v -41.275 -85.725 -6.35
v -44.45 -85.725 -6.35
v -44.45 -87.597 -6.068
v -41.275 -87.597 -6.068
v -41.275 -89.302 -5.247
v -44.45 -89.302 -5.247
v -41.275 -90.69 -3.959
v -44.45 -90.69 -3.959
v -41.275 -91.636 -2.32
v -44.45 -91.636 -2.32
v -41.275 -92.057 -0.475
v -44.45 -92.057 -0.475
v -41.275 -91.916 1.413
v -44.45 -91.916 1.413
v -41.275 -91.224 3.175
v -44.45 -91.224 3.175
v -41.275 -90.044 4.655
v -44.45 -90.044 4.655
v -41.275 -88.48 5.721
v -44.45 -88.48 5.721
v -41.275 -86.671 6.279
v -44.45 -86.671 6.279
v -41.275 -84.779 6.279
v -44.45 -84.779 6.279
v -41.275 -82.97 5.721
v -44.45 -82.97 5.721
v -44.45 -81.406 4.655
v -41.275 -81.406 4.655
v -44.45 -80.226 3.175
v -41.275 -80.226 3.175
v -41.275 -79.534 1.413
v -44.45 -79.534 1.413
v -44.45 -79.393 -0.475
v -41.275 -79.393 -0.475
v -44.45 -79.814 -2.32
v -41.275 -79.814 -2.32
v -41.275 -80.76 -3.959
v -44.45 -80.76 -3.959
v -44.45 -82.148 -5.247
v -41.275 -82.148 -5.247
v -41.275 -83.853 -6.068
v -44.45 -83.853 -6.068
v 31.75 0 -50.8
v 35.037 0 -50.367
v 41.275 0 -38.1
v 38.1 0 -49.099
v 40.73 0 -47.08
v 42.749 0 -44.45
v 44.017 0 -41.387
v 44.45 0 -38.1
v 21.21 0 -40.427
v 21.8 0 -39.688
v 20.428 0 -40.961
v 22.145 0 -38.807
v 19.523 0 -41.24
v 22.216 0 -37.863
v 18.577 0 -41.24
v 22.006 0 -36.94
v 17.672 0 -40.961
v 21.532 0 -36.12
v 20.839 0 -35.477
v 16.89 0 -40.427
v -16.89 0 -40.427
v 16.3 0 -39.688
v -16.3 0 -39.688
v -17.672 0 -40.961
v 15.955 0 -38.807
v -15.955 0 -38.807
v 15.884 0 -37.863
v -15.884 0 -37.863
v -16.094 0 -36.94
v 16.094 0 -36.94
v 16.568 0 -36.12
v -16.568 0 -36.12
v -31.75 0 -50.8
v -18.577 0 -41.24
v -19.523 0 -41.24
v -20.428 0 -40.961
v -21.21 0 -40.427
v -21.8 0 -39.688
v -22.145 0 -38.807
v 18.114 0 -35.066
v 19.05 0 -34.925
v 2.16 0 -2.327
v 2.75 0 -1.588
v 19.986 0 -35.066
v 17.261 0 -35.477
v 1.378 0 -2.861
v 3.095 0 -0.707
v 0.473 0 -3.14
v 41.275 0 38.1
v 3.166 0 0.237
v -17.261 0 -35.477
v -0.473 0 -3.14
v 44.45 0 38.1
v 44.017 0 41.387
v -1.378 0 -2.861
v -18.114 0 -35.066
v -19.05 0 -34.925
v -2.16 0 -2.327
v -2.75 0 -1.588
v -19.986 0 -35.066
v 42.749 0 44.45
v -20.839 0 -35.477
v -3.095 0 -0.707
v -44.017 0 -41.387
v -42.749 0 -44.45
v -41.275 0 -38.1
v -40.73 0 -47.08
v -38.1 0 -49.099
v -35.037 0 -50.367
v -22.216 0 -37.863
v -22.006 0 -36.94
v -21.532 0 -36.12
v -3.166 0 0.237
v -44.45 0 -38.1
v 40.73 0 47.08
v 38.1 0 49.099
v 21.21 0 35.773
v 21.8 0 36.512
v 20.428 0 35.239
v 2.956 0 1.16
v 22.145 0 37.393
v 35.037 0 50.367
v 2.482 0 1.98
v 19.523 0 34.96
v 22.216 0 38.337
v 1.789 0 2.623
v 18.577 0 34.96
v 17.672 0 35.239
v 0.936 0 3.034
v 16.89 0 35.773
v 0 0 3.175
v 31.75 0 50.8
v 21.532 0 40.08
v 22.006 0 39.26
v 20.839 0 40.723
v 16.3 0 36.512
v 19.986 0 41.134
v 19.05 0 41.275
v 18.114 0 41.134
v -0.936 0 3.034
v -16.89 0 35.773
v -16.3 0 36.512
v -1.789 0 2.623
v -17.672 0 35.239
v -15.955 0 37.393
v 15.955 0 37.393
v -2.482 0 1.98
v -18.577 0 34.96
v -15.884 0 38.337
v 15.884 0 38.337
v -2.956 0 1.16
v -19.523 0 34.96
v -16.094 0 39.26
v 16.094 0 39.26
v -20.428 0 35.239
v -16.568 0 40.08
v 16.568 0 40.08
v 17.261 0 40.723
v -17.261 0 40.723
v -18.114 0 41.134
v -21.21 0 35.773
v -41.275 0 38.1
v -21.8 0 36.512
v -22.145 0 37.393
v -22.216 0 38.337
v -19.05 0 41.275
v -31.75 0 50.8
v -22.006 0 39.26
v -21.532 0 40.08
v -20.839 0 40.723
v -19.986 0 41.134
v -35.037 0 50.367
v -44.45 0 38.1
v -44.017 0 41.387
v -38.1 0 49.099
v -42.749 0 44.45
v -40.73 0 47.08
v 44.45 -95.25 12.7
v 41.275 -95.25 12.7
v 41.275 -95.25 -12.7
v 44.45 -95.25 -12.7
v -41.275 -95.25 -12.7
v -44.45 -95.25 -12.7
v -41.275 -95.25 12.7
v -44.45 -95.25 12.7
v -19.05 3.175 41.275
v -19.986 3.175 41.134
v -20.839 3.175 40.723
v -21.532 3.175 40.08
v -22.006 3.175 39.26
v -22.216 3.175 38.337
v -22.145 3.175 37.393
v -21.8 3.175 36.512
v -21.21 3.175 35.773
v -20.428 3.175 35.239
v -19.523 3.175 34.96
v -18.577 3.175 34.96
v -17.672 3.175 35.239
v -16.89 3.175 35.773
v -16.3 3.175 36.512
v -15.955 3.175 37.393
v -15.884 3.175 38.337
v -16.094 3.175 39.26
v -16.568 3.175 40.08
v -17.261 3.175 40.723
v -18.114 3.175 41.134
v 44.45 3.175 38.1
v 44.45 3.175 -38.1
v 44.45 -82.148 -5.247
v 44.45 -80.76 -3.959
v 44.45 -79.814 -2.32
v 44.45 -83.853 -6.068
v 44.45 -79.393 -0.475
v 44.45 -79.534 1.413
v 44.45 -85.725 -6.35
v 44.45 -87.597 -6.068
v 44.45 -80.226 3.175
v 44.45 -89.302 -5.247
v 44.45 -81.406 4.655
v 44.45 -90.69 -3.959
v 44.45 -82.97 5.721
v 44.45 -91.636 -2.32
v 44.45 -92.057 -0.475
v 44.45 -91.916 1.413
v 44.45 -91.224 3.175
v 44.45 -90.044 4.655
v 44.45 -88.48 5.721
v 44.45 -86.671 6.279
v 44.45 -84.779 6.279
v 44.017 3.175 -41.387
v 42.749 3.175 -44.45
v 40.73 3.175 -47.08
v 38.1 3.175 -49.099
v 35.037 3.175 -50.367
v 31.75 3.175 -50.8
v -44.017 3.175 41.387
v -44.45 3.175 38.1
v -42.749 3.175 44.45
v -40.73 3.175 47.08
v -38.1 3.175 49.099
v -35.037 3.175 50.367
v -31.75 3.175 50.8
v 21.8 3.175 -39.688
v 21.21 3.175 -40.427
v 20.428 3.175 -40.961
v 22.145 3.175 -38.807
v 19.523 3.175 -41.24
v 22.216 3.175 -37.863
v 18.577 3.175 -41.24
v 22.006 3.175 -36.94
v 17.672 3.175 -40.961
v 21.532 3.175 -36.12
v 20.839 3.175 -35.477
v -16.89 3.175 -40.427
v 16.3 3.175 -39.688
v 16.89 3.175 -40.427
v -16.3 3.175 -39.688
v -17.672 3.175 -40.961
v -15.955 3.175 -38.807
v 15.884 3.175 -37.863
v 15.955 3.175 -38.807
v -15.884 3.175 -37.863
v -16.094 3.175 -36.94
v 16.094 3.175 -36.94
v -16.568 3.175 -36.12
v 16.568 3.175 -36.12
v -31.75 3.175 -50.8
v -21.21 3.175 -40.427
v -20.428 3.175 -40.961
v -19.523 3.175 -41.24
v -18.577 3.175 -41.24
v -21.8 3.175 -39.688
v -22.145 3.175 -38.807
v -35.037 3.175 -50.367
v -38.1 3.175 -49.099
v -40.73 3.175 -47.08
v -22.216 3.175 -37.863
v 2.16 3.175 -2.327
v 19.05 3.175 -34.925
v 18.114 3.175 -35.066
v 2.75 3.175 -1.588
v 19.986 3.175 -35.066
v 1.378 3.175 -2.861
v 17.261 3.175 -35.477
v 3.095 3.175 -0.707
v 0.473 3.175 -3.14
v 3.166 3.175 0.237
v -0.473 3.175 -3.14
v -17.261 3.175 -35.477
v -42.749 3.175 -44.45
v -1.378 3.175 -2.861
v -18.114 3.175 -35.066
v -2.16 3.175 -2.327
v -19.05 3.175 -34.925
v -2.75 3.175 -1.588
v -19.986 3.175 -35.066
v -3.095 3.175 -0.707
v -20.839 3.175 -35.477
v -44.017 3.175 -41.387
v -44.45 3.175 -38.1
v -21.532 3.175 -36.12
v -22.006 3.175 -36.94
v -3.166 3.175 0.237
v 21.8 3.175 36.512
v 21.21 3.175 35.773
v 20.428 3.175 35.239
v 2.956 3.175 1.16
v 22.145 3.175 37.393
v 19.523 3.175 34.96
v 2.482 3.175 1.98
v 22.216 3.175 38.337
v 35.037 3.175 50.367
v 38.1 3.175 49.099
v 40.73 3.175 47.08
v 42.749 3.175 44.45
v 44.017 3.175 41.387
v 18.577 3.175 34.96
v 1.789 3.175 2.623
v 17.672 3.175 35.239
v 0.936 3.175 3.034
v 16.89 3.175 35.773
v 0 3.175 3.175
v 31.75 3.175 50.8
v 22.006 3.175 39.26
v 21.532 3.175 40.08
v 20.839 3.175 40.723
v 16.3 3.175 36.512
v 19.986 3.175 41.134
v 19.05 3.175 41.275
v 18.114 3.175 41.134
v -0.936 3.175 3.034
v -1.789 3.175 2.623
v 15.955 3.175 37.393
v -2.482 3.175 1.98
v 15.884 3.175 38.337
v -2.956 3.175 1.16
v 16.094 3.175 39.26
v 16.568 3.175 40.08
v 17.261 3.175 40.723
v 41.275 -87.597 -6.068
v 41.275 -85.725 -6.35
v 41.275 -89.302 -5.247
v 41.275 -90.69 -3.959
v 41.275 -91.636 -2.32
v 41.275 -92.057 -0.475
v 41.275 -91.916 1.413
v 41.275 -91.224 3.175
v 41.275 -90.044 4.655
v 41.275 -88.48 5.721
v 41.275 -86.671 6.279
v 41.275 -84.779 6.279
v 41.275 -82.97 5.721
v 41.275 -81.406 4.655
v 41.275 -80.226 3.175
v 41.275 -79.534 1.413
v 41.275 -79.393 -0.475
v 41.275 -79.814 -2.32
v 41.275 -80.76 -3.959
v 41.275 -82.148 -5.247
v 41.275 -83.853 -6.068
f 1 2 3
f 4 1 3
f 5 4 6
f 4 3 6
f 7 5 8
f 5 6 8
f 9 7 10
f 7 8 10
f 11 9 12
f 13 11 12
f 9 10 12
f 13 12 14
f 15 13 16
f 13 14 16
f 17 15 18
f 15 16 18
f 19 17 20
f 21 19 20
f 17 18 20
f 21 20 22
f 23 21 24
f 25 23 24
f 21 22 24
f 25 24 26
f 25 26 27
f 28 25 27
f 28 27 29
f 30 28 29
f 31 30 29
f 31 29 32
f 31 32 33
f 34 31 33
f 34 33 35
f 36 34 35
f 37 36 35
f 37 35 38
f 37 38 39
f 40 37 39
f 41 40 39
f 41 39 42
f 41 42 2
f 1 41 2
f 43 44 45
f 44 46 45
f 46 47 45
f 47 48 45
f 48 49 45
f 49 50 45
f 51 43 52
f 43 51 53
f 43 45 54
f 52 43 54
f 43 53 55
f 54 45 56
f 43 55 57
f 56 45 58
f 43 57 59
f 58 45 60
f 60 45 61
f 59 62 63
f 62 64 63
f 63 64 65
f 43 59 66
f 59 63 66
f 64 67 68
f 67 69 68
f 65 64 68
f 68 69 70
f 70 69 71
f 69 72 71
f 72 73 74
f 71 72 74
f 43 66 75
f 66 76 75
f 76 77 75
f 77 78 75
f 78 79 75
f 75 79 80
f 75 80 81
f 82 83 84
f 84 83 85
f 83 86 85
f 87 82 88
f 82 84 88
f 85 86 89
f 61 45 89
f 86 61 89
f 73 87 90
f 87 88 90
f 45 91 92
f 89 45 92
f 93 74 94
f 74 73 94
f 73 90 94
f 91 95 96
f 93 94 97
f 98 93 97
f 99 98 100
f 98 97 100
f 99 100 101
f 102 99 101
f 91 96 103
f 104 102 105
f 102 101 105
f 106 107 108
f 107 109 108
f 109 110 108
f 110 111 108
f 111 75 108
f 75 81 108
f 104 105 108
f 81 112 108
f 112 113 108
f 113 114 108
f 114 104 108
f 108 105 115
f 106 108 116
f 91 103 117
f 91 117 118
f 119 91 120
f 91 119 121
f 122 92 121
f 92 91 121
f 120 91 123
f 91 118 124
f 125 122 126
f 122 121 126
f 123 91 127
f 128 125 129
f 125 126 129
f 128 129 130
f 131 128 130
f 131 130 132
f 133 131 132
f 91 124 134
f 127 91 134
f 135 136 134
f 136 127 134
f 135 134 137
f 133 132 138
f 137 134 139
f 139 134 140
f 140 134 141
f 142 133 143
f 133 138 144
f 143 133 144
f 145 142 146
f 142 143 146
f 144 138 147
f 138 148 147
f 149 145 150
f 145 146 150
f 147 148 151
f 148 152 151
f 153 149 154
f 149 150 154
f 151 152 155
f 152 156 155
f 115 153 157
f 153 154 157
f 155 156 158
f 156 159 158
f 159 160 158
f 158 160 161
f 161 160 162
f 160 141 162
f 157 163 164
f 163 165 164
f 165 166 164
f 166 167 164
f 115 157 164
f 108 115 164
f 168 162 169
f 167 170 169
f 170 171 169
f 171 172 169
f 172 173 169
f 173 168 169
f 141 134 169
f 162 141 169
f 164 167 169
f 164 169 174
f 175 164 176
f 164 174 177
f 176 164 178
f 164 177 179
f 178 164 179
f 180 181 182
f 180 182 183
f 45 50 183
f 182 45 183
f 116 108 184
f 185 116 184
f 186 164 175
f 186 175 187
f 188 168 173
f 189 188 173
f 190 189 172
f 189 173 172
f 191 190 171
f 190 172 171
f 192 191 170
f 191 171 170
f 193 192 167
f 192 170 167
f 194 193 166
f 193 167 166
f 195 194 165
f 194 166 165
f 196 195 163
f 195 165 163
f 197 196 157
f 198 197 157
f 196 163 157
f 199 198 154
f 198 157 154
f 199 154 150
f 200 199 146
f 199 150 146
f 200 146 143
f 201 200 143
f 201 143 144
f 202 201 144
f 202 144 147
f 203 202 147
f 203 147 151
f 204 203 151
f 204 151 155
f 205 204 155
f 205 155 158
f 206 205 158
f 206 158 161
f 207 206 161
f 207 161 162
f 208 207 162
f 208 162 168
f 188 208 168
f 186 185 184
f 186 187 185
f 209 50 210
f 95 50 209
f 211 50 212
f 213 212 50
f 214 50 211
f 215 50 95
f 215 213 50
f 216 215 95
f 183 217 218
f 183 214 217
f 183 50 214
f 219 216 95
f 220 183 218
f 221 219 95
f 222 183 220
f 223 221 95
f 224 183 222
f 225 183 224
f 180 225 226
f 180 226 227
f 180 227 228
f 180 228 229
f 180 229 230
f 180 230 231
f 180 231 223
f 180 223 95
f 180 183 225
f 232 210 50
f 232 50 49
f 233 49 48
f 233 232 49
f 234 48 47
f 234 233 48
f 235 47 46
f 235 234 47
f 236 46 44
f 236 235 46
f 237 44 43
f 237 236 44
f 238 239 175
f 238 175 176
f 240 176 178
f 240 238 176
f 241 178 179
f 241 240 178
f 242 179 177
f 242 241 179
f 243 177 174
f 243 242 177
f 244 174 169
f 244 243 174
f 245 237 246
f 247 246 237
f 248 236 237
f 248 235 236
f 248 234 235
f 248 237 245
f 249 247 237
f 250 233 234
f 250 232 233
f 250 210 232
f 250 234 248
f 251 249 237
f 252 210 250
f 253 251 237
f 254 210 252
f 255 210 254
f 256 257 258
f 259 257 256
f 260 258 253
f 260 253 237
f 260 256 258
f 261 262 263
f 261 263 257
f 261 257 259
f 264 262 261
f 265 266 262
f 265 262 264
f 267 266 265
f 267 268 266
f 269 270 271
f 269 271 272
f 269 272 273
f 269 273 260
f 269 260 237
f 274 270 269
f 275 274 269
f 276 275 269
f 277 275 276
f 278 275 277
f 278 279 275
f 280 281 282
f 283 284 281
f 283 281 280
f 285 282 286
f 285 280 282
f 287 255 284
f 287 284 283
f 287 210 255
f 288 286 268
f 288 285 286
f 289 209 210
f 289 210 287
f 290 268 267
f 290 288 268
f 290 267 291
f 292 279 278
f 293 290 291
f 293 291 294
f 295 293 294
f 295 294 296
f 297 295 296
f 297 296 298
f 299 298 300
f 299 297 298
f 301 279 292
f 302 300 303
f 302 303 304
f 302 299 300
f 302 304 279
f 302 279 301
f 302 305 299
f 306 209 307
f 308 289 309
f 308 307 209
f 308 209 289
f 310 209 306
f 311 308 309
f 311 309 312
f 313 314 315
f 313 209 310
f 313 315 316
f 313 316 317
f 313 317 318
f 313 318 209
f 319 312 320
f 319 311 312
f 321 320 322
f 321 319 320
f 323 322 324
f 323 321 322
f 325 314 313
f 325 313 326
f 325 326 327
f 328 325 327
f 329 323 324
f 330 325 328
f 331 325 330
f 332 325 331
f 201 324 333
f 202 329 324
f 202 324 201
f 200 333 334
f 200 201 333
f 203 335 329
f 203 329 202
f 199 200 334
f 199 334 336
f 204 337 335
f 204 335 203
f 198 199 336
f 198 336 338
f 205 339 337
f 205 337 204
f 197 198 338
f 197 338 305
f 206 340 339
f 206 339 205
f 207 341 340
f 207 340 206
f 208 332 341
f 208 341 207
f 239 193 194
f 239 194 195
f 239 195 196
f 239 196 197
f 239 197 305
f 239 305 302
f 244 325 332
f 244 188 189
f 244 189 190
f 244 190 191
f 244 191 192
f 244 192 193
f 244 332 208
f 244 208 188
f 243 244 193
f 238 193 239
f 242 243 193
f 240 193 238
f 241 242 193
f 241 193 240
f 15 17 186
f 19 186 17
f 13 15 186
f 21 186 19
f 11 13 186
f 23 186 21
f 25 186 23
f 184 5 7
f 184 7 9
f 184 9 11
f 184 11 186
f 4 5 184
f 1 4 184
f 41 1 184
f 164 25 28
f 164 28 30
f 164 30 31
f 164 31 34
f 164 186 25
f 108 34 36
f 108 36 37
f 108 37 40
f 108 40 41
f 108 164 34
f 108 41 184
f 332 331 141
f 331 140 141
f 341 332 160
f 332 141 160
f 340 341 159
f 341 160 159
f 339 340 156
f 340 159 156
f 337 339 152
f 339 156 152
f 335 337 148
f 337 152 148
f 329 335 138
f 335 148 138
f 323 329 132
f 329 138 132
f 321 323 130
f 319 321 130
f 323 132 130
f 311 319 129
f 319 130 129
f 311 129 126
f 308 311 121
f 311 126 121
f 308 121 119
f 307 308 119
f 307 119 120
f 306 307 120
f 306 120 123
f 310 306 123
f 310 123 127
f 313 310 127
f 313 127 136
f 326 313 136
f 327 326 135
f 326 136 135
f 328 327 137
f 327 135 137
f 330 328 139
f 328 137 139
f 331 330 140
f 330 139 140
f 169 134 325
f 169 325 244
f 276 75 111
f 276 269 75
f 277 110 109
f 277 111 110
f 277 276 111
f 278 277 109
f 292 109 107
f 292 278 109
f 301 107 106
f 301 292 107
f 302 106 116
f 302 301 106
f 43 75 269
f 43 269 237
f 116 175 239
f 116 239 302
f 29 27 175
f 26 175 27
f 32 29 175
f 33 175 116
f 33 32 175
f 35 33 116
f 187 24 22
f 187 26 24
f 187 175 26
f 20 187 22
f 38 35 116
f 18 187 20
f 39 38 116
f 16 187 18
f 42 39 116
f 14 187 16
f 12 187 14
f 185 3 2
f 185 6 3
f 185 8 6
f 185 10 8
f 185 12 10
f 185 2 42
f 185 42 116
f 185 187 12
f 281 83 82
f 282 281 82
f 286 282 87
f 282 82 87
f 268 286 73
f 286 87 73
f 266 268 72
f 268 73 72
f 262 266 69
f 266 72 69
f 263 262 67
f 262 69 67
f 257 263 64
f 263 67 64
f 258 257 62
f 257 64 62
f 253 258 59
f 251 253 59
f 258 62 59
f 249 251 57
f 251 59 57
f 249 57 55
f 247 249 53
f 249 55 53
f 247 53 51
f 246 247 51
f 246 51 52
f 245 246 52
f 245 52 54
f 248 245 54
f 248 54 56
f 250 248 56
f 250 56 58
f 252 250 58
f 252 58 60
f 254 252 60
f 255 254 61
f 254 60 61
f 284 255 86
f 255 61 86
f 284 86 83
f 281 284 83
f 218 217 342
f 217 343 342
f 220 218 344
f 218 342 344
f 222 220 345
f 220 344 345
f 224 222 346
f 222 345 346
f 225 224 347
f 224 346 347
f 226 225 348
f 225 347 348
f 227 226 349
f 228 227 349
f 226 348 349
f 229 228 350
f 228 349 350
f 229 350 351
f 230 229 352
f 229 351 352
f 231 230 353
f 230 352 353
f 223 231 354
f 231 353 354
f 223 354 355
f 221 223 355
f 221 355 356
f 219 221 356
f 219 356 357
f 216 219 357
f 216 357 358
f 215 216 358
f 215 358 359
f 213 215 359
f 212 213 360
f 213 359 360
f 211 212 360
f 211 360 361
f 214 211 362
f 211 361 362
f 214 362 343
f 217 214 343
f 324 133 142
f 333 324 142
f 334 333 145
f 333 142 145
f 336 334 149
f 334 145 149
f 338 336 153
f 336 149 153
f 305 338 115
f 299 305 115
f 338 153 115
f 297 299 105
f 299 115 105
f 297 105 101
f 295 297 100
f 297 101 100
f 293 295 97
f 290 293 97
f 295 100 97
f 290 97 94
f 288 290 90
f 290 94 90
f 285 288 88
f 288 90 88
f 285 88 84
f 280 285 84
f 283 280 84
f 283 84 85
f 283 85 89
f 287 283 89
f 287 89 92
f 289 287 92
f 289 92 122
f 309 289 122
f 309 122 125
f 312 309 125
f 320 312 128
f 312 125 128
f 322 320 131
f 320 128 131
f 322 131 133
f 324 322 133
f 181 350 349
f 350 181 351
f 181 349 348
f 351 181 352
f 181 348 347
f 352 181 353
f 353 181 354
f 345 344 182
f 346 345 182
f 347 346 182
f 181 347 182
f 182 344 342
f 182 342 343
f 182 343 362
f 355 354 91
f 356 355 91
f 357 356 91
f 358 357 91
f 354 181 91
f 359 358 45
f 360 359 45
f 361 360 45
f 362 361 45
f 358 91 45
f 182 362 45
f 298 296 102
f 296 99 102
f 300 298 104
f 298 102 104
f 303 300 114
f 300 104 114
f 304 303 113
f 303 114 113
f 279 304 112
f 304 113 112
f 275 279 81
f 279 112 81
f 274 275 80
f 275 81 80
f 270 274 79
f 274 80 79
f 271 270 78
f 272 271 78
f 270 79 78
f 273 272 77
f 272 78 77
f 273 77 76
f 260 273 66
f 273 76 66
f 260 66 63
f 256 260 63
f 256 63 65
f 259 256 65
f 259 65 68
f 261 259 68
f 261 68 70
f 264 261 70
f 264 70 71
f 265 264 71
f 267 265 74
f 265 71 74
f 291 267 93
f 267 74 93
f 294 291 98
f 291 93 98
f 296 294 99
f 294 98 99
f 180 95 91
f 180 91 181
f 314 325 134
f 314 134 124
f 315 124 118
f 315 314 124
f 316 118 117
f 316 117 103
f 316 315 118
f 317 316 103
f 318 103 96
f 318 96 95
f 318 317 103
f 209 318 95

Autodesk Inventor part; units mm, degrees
ref_plane "YZ Plane" through (0, 0, 0) normal (1, 0, 0) x (0, 1, 0)
ref_plane "XZ Plane" through (0, 0, 0) normal (0, 1, 0) x (-1, 0, 0)
ref_plane "XY Plane" through (0, 0, 0) normal (0, 0, 1) x (1, 0, 0)
sketch "Sketch2" plane through (0, 0, 0) normal (0, 1, 0) x (-1, 0, 0)
  line L0 (-44.45, 50.8) -> (44.45, 50.8)
  line L1 (44.45, 50.8) -> (44.45, -50.8)
  line L2 (44.45, -50.8) -> (-44.45, -50.8)
  line L3 (-44.45, -50.8) -> (-44.45, 50.8)
  point P0 (0, 0)
  dimension "d0" = 44.45
  dimension "d1" = 44.45
  dimension "d2" = 50.8
  dimension "d3" = 50.8
extrude "Extrusion1" add sketch "Sketch2" along normal blind 3.175
fillet "Fillet1" radius 12.7 4 edges at (44.45, 1.5875, 50.8) (-44.45, 1.5875, 50.8) (44.45, 1.5875, -50.8) (-44.45, 1.5875, -50.8)
sketch "Sketch3" plane through (0, 3.175, 0) normal (0, 1, 0) x (1, 0, 0)
  line L0 (-19.05, 38.1) -> (19.05, 38.1) construction
  line L1 (19.05, 38.1) -> (19.05, -38.1) construction
  line L2 (19.05, -38.1) -> (-19.05, -38.1) construction
  line L3 (-19.05, -38.1) -> (-19.05, 38.1) construction
  point P0 (0, 0)
  point P1 (0, 0)
  point P2 (-19.05, 0)
  point P3 (0, 38.1)
  dimension "d36" = 38.1
  dimension "d37" = 76.2
hole "Hole1" at (-19.05, 3.175, -38.1) at (19.05, 3.175, -38.1) at (19.05, 3.175, 38.1) at (-19.05, 3.175, 38.1) at (0, 3.175, 0) direction (0, -1, 0) diameter 6.35 end through all
sketch "Sketch4" plane through (0, 0, 0) normal (0, -1, 0) x (1, 0, 0)
  circle A0 centre (-19.05, 38.1) radius 3.175 projected
  line L0 (44.45, -38.1) -> (44.45, 38.1) projected
  line L1 (-44.45, 38.1) -> (-44.45, -38.1) projected
  line L2 (44.45, 38.1) -> (41.275, 38.1)
  line L3 (41.275, 38.1) -> (41.275, -38.1)
  line L4 (41.275, -38.1) -> (44.45, -38.1)
  line L5 (44.45, -38.1) -> (44.45, 38.1)
  line L6 (-44.45, 38.1) -> (-41.275, 38.1)
  line L7 (-41.275, 38.1) -> (-41.275, -38.1)
  line L8 (-41.275, -38.1) -> (-44.45, -38.1)
  line L9 (-44.45, -38.1) -> (-44.45, 38.1)
  dimension "d18" = 3.175
  dimension "d19" = 3.175
  dimension "d20" = 76.2
  dimension "d21" = 76.2
extrude "Extrusion2" add sketch "Sketch4" along normal blind 95.25 contours L4 L3 L2 L0 | L6 L7 L8 L1
sketch "Sketch5" plane through (44.45, 3.175, 38.1) normal (1, 0, 0) x (0, 0, -1)
  line L0 (0, -3.175) -> (0, -98.425) projected
  line L1 (76.2, -3.175) -> (76.2, -98.425) projected
  line L2 (0, -3.175) -> (25.4, -98.425)
  line L3 (76.2, -3.175) -> (50.8, -98.425)
  line L4 (0, -3.175) -> (0, -98.425)
  line L5 (25.4, -98.425) -> (0, -98.425)
  line L6 (50.8, -98.425) -> (76.2, -98.425)
  line L7 (76.2, -98.425) -> (76.2, -3.175)
  point P0 (38.1, -3.175)
extrude "Extrusion3" cut sketch "Sketch5" against normal blind 127
sketch "Sketch6" plane through (44.45, 3.175, 38.1) normal (1, 0, 0) x (0, 0, -1)
  line L0 (25.4, -98.425) -> (50.8, -98.425) projected
  point P0 (38.1, -3.175)
  point P1 (38.1, -88.9)
  dimension "d28" = 9.525
hole "Hole2" at (44.45, -85.725, 0) direction (-1, 0, 0) diameter 12.7 end through all
equation "\"d1\" = d0"
equation "\"d3\" = d2"
equation "\"d4\" = metalThickness"
equation "\"d18\" = metalThickness"
equation "\"d19\" = metalThickness"
equation "\"d21\" = d20"
equation "\"metalThickness\" = 3.175"
properties part number "Caster2" material "Aluminum-6061"
